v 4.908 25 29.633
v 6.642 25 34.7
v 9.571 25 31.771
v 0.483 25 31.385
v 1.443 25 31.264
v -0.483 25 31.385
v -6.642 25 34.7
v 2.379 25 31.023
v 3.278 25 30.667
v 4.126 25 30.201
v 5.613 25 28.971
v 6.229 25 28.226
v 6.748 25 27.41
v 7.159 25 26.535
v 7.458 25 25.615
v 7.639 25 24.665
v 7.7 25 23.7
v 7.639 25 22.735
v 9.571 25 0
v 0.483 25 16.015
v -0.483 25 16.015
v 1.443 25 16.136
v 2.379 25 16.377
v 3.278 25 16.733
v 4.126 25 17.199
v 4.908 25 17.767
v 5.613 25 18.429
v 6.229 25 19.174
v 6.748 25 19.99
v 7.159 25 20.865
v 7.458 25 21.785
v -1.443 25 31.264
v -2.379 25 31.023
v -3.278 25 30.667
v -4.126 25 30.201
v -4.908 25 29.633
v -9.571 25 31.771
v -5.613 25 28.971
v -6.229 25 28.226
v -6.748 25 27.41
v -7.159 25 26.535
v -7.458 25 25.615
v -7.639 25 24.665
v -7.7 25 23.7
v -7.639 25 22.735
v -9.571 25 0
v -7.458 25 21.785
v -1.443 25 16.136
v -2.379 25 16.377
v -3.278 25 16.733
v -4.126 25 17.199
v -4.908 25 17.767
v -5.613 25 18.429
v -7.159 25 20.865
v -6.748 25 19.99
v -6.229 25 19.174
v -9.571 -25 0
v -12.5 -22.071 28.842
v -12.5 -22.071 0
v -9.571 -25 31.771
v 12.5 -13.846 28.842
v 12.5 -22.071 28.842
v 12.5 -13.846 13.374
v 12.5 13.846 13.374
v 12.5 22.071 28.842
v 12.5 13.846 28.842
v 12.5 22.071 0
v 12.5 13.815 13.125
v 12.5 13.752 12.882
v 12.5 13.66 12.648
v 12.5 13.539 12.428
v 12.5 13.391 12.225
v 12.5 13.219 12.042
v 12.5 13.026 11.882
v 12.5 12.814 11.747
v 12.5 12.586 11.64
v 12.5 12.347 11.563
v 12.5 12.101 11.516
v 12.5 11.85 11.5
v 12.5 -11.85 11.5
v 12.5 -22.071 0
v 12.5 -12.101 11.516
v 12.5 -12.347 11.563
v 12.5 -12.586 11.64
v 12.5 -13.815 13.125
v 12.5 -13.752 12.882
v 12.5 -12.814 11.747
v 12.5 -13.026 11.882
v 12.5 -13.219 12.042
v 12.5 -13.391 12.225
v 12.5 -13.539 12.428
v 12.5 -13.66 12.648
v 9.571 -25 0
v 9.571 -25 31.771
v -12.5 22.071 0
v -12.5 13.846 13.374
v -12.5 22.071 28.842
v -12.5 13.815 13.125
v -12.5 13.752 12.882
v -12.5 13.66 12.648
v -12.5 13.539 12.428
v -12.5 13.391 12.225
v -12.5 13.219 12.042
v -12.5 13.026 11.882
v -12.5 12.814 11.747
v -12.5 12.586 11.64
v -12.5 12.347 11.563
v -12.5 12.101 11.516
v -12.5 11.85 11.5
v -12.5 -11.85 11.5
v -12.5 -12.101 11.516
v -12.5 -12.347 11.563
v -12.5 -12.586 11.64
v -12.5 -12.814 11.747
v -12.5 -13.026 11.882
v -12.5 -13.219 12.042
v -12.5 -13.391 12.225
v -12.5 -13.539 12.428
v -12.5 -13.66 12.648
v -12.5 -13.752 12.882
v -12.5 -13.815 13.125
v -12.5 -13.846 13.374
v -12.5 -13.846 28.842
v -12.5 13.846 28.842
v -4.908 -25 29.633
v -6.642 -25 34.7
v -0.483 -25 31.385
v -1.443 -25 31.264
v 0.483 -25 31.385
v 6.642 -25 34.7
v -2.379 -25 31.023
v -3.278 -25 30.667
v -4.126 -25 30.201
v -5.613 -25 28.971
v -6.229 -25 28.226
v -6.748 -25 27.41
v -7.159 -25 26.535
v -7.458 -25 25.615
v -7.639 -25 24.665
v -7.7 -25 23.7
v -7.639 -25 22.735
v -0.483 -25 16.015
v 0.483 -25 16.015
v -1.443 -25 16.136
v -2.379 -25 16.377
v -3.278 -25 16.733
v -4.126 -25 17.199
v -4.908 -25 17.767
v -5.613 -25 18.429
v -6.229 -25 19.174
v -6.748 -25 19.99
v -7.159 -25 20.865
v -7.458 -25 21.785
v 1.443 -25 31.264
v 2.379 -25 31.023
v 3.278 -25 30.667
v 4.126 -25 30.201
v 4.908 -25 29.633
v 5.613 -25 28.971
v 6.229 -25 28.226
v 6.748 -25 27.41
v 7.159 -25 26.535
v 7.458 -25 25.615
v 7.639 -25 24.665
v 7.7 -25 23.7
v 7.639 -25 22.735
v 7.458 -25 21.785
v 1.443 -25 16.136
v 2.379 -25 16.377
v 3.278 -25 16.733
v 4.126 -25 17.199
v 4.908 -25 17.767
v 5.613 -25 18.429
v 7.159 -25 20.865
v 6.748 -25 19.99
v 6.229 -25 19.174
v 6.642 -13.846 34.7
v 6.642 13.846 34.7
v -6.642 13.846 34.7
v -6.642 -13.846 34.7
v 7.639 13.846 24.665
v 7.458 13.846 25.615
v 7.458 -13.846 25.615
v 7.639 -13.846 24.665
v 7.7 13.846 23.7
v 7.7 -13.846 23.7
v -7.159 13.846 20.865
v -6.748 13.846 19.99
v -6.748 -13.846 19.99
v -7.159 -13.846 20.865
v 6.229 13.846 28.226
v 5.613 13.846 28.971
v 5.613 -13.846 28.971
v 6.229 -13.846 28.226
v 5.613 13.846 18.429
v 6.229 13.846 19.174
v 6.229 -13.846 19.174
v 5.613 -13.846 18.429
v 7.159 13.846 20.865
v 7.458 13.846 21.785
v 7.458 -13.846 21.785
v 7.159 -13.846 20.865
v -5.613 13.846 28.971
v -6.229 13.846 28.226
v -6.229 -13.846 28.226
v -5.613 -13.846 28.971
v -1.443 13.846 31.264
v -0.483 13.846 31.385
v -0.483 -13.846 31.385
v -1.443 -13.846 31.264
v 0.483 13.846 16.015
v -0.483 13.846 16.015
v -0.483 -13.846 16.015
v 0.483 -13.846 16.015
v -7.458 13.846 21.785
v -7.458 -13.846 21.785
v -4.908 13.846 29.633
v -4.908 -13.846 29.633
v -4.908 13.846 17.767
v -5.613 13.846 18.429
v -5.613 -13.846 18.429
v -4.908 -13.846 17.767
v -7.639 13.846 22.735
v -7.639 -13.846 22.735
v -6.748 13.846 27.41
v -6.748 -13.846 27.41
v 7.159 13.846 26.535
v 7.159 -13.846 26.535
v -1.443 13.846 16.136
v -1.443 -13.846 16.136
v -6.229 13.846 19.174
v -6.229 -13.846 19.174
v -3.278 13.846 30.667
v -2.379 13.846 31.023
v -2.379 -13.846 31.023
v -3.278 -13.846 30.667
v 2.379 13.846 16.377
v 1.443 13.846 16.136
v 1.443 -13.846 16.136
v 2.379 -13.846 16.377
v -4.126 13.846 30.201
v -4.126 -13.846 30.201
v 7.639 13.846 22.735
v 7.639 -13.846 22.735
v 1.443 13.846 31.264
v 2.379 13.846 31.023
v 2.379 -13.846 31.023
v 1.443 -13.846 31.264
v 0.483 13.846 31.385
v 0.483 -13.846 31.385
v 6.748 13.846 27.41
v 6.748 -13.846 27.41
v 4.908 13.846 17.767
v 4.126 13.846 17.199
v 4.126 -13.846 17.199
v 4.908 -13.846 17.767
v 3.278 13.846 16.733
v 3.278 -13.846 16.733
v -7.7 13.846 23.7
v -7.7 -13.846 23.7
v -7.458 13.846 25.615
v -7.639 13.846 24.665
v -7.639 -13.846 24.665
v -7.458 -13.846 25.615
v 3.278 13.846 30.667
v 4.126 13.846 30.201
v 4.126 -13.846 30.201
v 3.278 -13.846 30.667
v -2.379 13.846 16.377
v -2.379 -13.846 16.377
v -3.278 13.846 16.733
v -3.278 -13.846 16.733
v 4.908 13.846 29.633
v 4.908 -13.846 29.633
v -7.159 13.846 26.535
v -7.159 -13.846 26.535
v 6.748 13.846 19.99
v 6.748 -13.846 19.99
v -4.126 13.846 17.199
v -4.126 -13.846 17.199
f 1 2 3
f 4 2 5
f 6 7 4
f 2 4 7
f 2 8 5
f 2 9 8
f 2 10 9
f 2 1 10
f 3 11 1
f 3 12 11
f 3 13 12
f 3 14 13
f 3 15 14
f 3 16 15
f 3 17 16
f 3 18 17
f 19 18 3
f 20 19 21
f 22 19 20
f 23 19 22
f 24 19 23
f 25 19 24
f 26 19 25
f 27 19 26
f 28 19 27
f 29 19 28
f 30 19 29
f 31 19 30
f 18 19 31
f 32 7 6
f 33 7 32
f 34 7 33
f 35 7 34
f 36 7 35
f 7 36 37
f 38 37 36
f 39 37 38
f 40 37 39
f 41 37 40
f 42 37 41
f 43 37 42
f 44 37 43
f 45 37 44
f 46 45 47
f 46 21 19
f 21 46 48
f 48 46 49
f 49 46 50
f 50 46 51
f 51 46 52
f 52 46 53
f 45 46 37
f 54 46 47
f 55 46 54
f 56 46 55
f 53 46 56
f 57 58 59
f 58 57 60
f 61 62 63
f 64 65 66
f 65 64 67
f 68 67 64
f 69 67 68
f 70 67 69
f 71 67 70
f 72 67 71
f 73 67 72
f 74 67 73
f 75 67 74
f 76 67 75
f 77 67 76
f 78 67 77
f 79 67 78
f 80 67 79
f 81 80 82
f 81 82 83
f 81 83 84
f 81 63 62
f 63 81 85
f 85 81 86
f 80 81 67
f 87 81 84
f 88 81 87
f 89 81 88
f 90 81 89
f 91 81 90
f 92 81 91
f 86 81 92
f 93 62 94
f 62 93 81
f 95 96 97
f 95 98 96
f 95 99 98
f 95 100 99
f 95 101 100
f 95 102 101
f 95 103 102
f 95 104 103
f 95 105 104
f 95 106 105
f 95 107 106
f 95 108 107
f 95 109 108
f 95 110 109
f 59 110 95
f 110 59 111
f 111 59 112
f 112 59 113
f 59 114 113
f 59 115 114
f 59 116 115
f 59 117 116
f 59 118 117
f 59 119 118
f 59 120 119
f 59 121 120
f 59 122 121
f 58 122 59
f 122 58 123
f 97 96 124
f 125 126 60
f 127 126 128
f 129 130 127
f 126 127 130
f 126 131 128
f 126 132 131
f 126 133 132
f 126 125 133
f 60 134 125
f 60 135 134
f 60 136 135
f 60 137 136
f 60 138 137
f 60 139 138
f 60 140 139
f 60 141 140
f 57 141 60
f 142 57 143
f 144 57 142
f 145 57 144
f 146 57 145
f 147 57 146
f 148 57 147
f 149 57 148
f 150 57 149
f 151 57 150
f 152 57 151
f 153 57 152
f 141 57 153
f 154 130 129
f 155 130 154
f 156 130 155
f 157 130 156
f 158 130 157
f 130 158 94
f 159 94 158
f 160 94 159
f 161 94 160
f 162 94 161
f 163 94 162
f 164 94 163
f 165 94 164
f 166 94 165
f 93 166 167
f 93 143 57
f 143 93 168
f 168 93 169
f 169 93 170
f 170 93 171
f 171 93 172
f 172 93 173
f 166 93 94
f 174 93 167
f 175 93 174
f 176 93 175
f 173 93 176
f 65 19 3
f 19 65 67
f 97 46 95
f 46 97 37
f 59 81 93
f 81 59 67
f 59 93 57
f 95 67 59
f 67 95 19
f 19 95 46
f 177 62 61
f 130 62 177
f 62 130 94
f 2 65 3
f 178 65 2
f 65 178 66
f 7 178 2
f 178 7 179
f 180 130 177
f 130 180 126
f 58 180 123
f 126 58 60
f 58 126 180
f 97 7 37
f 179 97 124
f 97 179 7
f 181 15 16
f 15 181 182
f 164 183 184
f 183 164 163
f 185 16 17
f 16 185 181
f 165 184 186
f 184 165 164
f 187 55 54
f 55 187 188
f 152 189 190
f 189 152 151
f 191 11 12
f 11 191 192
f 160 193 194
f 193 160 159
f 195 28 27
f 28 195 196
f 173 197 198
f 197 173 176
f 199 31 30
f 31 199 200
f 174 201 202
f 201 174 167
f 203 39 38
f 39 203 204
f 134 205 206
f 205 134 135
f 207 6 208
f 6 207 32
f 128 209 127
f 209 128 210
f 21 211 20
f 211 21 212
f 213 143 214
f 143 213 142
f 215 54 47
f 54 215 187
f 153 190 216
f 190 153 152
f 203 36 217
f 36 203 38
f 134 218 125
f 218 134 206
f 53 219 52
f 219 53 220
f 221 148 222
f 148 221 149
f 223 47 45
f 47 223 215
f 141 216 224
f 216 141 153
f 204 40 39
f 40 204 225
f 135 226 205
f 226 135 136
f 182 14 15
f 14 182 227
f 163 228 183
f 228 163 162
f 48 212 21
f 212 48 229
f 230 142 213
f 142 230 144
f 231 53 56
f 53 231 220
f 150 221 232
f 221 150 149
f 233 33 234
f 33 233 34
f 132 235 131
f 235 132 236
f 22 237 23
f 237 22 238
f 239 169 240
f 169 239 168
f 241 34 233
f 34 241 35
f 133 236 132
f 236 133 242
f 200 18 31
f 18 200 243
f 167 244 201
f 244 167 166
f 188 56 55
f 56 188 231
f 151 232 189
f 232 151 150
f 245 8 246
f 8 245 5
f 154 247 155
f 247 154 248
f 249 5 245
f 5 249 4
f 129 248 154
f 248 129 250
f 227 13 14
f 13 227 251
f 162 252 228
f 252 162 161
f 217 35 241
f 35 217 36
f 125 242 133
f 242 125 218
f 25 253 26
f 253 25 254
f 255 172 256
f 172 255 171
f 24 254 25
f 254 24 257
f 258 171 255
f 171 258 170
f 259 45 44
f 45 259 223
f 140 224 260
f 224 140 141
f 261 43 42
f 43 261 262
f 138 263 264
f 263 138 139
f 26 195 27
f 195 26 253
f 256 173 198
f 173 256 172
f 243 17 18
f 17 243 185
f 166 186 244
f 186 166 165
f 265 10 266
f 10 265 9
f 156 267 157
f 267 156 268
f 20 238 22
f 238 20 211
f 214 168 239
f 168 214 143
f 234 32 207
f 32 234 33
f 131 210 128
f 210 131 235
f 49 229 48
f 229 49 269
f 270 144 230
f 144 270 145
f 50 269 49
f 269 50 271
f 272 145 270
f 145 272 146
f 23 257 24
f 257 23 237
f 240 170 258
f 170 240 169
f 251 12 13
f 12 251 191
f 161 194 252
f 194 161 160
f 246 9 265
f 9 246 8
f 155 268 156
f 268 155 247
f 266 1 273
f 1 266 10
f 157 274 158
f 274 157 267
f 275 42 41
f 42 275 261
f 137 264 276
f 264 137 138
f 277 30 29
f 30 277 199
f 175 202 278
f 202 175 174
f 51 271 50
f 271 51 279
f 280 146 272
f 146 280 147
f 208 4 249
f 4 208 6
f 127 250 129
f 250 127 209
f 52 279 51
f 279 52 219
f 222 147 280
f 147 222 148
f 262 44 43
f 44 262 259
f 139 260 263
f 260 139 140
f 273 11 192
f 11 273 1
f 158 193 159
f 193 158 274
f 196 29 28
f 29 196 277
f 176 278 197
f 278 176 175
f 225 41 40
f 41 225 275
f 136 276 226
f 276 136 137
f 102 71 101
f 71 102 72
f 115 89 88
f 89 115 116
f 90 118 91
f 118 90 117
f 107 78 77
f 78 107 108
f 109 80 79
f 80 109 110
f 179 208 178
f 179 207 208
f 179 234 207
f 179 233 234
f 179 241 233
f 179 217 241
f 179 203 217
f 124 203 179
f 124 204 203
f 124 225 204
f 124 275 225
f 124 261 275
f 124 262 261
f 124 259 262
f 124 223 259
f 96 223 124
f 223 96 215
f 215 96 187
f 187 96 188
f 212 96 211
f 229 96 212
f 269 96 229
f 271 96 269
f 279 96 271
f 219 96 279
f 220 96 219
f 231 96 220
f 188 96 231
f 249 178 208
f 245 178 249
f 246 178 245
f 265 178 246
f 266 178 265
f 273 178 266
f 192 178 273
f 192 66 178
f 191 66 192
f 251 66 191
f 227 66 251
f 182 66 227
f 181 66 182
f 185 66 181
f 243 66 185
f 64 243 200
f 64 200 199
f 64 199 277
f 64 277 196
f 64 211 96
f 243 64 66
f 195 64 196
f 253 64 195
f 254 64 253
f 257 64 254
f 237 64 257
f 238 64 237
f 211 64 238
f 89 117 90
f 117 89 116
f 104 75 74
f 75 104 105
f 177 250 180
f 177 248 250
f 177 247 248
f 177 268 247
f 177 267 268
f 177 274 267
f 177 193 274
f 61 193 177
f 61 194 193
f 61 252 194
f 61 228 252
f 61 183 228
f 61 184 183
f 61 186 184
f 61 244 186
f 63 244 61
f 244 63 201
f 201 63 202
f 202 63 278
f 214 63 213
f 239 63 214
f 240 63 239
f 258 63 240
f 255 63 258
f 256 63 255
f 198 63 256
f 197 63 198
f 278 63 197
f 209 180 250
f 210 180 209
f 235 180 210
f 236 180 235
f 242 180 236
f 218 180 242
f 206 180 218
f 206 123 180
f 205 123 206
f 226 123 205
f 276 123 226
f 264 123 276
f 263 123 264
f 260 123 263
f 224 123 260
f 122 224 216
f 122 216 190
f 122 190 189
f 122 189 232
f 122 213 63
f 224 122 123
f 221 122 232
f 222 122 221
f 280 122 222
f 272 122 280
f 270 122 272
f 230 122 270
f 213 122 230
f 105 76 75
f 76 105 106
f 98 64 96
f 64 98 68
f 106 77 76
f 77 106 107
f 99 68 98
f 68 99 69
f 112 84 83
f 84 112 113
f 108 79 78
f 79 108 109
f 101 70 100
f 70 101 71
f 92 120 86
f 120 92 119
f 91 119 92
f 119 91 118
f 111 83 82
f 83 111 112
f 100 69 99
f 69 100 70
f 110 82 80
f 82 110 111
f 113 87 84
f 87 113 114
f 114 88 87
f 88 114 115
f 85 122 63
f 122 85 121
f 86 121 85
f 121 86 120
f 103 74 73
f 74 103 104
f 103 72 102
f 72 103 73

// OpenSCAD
// Remixing from https://thangs.com/designer/K2_Kevin/3d-model/MultiBoom%20Arm%20-%20Multiboard%20Boom%20Arm-1031270


//sleek Mount
ovDims=[25,50,34.7];
chamfer=5;
rad=+2;
fudge=0.1;
holeDia=15.4;
opngDims=[ovDims.y,27.7,ovDims.z-11.5];
$fn=50;

*translate([198.820,-270-0.83,-6.4]) import("MultiBOOM_Mount-A_Wall_T-BOLT_STRONG.stl");


//body

difference(){
  intersection(){
    linear_extrude(ovDims.z) offset(delta=chamfer,chamfer=true) square([ovDims.x-chamfer*2,ovDims.y-chamfer*2],true);
    translate([0,0,ovDims.z/2-chamfer]) rotate([90,0,0]) linear_extrude(ovDims.y+fudge,center=true) offset(delta=chamfer*2,chamfer=true) square([ovDims.x-chamfer*4,ovDims.z-chamfer*2],true);
  }

  translate([0,0,23.7]) rotate([90,0,0]) cylinder(d=holeDia,h=ovDims.y+fudge,center=true);
  
  
  translate([0,0,opngDims.z/2+11.5+rad/2]) 
    rotate([0,90,0]) 
      linear_extrude(ovDims.x+fudge,center=true) hull() 
        for (ix=[-1,1],iy=[-1,1])
          translate([ix*(opngDims.z/2-rad/2),iy*(opngDims.y/2-rad)]) circle(rad);
}
